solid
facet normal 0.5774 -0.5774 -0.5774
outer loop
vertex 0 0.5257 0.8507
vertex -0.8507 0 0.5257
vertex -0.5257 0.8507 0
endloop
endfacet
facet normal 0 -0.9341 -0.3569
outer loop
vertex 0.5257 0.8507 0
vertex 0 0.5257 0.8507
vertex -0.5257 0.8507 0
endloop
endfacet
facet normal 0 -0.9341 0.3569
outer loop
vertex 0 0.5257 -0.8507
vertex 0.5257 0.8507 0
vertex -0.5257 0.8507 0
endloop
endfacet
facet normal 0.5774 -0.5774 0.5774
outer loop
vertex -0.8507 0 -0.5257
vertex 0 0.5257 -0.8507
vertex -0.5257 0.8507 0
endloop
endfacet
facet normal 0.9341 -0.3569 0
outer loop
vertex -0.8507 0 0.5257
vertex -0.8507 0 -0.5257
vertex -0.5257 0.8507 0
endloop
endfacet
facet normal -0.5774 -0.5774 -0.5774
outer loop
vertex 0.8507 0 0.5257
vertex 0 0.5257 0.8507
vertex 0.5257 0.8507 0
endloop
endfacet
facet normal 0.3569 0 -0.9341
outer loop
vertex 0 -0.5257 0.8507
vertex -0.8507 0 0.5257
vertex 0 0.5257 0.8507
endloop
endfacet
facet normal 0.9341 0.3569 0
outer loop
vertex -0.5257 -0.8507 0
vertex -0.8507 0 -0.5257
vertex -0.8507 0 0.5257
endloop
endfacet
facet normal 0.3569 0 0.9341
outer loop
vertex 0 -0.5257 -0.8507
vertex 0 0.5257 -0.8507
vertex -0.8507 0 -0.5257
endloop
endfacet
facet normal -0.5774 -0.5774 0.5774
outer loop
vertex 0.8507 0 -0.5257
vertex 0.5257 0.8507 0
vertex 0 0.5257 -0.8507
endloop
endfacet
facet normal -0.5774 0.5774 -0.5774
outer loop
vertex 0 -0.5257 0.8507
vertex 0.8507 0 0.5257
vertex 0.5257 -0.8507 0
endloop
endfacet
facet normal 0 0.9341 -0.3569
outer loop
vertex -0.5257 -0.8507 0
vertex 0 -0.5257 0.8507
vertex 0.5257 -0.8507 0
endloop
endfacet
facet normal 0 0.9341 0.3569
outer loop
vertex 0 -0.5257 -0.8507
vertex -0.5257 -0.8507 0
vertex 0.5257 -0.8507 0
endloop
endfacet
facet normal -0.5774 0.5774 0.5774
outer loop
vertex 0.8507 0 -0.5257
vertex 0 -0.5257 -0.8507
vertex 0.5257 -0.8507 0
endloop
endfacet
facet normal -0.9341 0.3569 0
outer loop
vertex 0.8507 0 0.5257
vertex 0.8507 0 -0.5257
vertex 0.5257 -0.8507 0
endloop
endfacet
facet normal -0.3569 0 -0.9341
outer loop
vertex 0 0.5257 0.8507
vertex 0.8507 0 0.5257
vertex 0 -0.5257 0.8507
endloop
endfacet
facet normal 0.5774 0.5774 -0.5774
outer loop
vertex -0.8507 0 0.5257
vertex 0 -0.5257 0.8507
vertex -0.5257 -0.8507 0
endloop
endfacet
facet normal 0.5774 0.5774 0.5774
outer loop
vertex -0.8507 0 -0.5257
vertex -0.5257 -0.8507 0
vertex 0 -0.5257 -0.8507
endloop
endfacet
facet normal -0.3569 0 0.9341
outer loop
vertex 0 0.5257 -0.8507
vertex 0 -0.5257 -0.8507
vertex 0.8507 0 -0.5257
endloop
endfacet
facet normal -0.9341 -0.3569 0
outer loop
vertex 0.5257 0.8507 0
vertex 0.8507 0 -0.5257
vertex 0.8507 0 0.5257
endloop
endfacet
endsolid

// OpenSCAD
// icosphere code copied with pride from Andreas Kahler
// http://blog.andreaskahler.com/2009/06/creating-icosphere-mesh-in-code.html
$fn=10;


/* [show] */

showStatistics=true;
icosphere();
*test();


// set recursion to the desired level. 0=20 tris, 1=80 tris, 2=320 tris
module icosphere(radius=1,recursion=0,icoPnts,icoTris){
  //t = (1 + sqrt(5))/2;
  //comment from monfera to get verts to unit sphere
  t= sqrt((5+sqrt(5))/10);
  s= sqrt((5-sqrt(5))/10);
  
  init=(icoPnts||icoTris) ? false : true; //initial call if icoPnts is empty
  
  // 1 --> draw icosphere from base mesh
  // 2 --> loop through base mesh and subdivide by 4 --> 20 steps
  // 3 --> loop through subdivided mesh and subdivide again (or subdivide by 16) --> 80 steps
  // 4 ...
  
  verts = [[-s, t, 0],  //0
           [ s, t, 0],
           [-s,-t, 0],
           [ s,-t, 0],
           [ 0,-s, t],
           [ 0, s, t],
           [ 0,-s,-t],
           [ 0, s,-t],
           [ t, 0,-s],
           [ t, 0, s],
           [-t, 0,-s],
           [-t, 0, s]]; //11
  
  //base mesh with 20 faces
  tris=  [
  //5 faces around point 0
    [ 0,11, 5], //0
    [ 0, 5, 1],
    [ 0, 1, 7],
    [ 0, 7,10],
    [ 0,10,11], 
  // 5 adjacent faces
    [ 1, 5, 9], //5
    [ 5,11, 4],
    [11,10, 2],
    [10, 7, 6],
    [ 7, 1, 8], 
  //5 faces around point 3
    [ 3, 9, 4], //10
    [ 3, 4, 2],
    [ 3, 2, 6],
    [ 3, 6, 8],
    [ 3, 8, 9], 
  //5 adjacent faces 
    [ 4, 9, 5], //15
    [ 2, 4,11],
    [ 6, 2,10],
    [ 8, 6, 7],
    [ 9, 8, 1]  //19
    ];
    
  if (recursion){
    verts= (init) ? verts : icoPnts;
    tris= (init) ? tris : icoTris;
    
    newSegments=recurseTris(verts,tris);
    newVerts=newSegments[0];
    newTris= newSegments[1];
    icosphere(radius,recursion-1,newVerts,newTris);
    
  }
  else if (init){//draw the base icosphere if no recursion and initial call
    scale(radius) polyhedron(verts,tris); 
    if (showStatistics)
      for (tri=tris){ //calculate the length of each tris edges
        l1=norm(verts[tri[0]]-verts[tri[1]]);
        l2=norm(verts[tri[1]]-verts[tri[2]]);
        l3=norm(verts[tri[2]]-verts[tri[0]]);
        lmin=min(l1,l2,l3); 
        lmax=max(l1,l2,l3);
        ldev=lmax-lmin; //deviation between edges
        echo(l1,l2,l3,ldev);
      }
    }
  else{ // if not initial call some recursion has to be happened
    scale(radius) polyhedron(icoPnts,icoTris); 
    if (showStatistics)
      for (tri=icoTris){ //calculate the length of each tris edges
        l1=norm(icoPnts[tri[0]]-icoPnts[tri[1]]);
        l2=norm(icoPnts[tri[1]]-icoPnts[tri[2]]);
        l3=norm(icoPnts[tri[2]]-icoPnts[tri[0]]);
        lmin=min(l1,l2,l3); 
        lmax=max(l1,l2,l3);
        ldev=lmax-lmin; //deviation between edges
        echo(l1,l2,l3,ldev);
      }
    
  }
}




/*adds verts if not already there, 
 takes array of vertices and indices of a tri to expand
 returns expanded array of verts and indices of new polygon with 4 faces
 [[verts],[0,(a),(c)],[1,(b),(a)],[2,(c),(b)],[(a),(b),(c)]] */
function addTris(verts,tri)= let(
    a= getMiddlePoint(verts[tri[0]],verts[tri[1]]), //will produce doubles
    b= getMiddlePoint(verts[tri[1]],verts[tri[2]]), //these are unique
    c= getMiddlePoint(verts[tri[2]],verts[tri[0]]), //these are unique
    
    aIdx = search(verts, a), //point a already exists
    l=len(verts)                       
  ) len(aIdx) ? [concat(verts,[a,b,c]),[[tri[0],l,l+2],   //1
                                        [tri[1],l+1,l],   //2
                                        [tri[2],l+2,l+1], //3
                                        [l,l+1,l+2]] ] :  //4

                [concat(verts,[b,c]), [[tri[0],aIdx,l+1], //1
                                      [tri[1],l,aIdx],    //2
                                      [tri[2],l+1,l],     //3
                                      [aIdx,l,l+1]] ];    //4


// recursive function that does one recursion on the whole icosphere (auto recursion steps derived from len(tris))
function recurseTris(verts,tris,newTris=[],steps=0,step=0)= let(
    stepsCnt = steps ? steps : len(tris)-1, //if initial call initialize steps
    newSegment=addTris(verts=verts,tri=tris[step]),
    newVerts=newSegment[0], //all old and new Vertices
    newerTris=concat(newTris,newSegment[1]) //only new Tris
  ) (stepsCnt==(step)) ? [newVerts,newerTris] :
                           recurseTris(newVerts,tris,newerTris,stepsCnt,step+1);
                
                
                
//get point between two verts on unity sphere
/* Point3D middle = new Point3D(
            (point1.X + point2.X) / 2.0, 
            (point1.Y + point2.Y) / 2.0, 
            (point1.Z + point2.Z) / 2.0);  --> (p1+p2)/2
            */
            
function getMiddlePoint(p1,p2)=fixPosition((p1+p2)/2);
//function getMiddlePoint(p1,p2)=(p1+p2)/2;



//fix position to be on unit sphere
/*
private int addVertex(Point3D p)
    {
        double length = Math.Sqrt(p.X * p.X + p.Y * p.Y + p.Z * p.Z);                --> norm(p)
        geometry.Positions.Add(new Point3D(p.X/length, p.Y/length, p.Z/length)); 
        return index++;
    }
    */
function fixPosition(p)=let(l=norm(p)) [p.x/l,p.y/l,p.z/l];
verts=[[-0.525731, 0.850651, 0], [0.525731, 0.850651, 0], [0, 0.525731, 0.850651]];
/* test if norm equals quadric mean and vector/2 = x/2,Y/2,Z/2
p=(verts[0]+verts[1])/2;
q=[(verts[0].x+verts[1].x)/2,
   (verts[0].y+verts[1].y)/2,
   (verts[0].z+verts[1].z)/2];

l=(verts[0]+verts[1])/2;
m=norm(p);
echo(q,l);
echo(l,m);
*/
module test(separate=false, inWhole=true){
  t= sqrt((5+sqrt(5))/10);
  s= sqrt((5-sqrt(5))/10);
  
  //1st and 2nd tri
  p0=[-s, t, 0];
  p1=[ s, t, 0];
  p11=[-t, 0, s];
  p5=[ 0, s, t];
  
  sideLngth=norm(p0-p11);
  r=sideLngth/(sqrt(3));
  rot=90;
  
        //0  1  2  3
  tVerts=[p0,p1,p5,p11];
  tTris=[[0,3,2],[0,2,1]];
    
  //         a       b       c
  //tVerts=tPoly;
  a=getMiddlePoint(tVerts[0],tVerts[1]);
  b=getMiddlePoint(tVerts[1],tVerts[2]);
  c=getMiddlePoint(tVerts[2],tVerts[0]);
  
  //create two separate new segments
  newSegment1=addTris(tVerts,tTris[0]);
  newSegment2=addTris(tVerts,tTris[1]);
  
  newVerts1=newSegment1[0]; //put just the new vertices in a new array
  newFaces1=newSegment1[1]; //indicies for the 1st new segment
  
  
  translate(a) sphere(0.05);
  echo(str("a,b,c: ",a,b,c));
  
           
  //base tris 
  color("green",0.5) polyhedron(tVerts,tTris); //"old" tris
  //separate segments of new tris
  if(separate){
    color("red",0.5) polyhedron(newSegment1[0],newSegment1[1]);
    color("orange",0.5) polyhedron(newSegment2[0],newSegment2[1]);
  }
  else if (inWhole){//create one new Segment (out of two tris) in whole
    newerSegments=recurseTris(tVerts,tTris);
    newVerts=newerSegments[0];
    newFaces=newerSegments[1];
    color("blue",0.5) polyhedron(newVerts,newFaces);
    echo(str("\ninput Verts    (",len(tVerts),"): ", tVerts,"\n",
             "output Verts (",len(newVerts),"): ", newVerts,"\n",
             "input Faces (",len(tTris),"): ", tTris,"\n",
             "output Faces (",len(newFaces),"): ", newFaces));
  }
  
  else{ //create one new Segment using the first one
    newSegments=addTris(newVerts1,tTris[1]); //new Segments using the new array
    newVerts=newSegments[0]; //all old and new vertices for two new segments
    newFaces2=newSegments[1]; //indicies for the 2nd new segment
    newFaces=concat(newFaces1,newFaces2);
    color("blue",0.5) polyhedron(newVerts,newFaces);
  }
}

  
